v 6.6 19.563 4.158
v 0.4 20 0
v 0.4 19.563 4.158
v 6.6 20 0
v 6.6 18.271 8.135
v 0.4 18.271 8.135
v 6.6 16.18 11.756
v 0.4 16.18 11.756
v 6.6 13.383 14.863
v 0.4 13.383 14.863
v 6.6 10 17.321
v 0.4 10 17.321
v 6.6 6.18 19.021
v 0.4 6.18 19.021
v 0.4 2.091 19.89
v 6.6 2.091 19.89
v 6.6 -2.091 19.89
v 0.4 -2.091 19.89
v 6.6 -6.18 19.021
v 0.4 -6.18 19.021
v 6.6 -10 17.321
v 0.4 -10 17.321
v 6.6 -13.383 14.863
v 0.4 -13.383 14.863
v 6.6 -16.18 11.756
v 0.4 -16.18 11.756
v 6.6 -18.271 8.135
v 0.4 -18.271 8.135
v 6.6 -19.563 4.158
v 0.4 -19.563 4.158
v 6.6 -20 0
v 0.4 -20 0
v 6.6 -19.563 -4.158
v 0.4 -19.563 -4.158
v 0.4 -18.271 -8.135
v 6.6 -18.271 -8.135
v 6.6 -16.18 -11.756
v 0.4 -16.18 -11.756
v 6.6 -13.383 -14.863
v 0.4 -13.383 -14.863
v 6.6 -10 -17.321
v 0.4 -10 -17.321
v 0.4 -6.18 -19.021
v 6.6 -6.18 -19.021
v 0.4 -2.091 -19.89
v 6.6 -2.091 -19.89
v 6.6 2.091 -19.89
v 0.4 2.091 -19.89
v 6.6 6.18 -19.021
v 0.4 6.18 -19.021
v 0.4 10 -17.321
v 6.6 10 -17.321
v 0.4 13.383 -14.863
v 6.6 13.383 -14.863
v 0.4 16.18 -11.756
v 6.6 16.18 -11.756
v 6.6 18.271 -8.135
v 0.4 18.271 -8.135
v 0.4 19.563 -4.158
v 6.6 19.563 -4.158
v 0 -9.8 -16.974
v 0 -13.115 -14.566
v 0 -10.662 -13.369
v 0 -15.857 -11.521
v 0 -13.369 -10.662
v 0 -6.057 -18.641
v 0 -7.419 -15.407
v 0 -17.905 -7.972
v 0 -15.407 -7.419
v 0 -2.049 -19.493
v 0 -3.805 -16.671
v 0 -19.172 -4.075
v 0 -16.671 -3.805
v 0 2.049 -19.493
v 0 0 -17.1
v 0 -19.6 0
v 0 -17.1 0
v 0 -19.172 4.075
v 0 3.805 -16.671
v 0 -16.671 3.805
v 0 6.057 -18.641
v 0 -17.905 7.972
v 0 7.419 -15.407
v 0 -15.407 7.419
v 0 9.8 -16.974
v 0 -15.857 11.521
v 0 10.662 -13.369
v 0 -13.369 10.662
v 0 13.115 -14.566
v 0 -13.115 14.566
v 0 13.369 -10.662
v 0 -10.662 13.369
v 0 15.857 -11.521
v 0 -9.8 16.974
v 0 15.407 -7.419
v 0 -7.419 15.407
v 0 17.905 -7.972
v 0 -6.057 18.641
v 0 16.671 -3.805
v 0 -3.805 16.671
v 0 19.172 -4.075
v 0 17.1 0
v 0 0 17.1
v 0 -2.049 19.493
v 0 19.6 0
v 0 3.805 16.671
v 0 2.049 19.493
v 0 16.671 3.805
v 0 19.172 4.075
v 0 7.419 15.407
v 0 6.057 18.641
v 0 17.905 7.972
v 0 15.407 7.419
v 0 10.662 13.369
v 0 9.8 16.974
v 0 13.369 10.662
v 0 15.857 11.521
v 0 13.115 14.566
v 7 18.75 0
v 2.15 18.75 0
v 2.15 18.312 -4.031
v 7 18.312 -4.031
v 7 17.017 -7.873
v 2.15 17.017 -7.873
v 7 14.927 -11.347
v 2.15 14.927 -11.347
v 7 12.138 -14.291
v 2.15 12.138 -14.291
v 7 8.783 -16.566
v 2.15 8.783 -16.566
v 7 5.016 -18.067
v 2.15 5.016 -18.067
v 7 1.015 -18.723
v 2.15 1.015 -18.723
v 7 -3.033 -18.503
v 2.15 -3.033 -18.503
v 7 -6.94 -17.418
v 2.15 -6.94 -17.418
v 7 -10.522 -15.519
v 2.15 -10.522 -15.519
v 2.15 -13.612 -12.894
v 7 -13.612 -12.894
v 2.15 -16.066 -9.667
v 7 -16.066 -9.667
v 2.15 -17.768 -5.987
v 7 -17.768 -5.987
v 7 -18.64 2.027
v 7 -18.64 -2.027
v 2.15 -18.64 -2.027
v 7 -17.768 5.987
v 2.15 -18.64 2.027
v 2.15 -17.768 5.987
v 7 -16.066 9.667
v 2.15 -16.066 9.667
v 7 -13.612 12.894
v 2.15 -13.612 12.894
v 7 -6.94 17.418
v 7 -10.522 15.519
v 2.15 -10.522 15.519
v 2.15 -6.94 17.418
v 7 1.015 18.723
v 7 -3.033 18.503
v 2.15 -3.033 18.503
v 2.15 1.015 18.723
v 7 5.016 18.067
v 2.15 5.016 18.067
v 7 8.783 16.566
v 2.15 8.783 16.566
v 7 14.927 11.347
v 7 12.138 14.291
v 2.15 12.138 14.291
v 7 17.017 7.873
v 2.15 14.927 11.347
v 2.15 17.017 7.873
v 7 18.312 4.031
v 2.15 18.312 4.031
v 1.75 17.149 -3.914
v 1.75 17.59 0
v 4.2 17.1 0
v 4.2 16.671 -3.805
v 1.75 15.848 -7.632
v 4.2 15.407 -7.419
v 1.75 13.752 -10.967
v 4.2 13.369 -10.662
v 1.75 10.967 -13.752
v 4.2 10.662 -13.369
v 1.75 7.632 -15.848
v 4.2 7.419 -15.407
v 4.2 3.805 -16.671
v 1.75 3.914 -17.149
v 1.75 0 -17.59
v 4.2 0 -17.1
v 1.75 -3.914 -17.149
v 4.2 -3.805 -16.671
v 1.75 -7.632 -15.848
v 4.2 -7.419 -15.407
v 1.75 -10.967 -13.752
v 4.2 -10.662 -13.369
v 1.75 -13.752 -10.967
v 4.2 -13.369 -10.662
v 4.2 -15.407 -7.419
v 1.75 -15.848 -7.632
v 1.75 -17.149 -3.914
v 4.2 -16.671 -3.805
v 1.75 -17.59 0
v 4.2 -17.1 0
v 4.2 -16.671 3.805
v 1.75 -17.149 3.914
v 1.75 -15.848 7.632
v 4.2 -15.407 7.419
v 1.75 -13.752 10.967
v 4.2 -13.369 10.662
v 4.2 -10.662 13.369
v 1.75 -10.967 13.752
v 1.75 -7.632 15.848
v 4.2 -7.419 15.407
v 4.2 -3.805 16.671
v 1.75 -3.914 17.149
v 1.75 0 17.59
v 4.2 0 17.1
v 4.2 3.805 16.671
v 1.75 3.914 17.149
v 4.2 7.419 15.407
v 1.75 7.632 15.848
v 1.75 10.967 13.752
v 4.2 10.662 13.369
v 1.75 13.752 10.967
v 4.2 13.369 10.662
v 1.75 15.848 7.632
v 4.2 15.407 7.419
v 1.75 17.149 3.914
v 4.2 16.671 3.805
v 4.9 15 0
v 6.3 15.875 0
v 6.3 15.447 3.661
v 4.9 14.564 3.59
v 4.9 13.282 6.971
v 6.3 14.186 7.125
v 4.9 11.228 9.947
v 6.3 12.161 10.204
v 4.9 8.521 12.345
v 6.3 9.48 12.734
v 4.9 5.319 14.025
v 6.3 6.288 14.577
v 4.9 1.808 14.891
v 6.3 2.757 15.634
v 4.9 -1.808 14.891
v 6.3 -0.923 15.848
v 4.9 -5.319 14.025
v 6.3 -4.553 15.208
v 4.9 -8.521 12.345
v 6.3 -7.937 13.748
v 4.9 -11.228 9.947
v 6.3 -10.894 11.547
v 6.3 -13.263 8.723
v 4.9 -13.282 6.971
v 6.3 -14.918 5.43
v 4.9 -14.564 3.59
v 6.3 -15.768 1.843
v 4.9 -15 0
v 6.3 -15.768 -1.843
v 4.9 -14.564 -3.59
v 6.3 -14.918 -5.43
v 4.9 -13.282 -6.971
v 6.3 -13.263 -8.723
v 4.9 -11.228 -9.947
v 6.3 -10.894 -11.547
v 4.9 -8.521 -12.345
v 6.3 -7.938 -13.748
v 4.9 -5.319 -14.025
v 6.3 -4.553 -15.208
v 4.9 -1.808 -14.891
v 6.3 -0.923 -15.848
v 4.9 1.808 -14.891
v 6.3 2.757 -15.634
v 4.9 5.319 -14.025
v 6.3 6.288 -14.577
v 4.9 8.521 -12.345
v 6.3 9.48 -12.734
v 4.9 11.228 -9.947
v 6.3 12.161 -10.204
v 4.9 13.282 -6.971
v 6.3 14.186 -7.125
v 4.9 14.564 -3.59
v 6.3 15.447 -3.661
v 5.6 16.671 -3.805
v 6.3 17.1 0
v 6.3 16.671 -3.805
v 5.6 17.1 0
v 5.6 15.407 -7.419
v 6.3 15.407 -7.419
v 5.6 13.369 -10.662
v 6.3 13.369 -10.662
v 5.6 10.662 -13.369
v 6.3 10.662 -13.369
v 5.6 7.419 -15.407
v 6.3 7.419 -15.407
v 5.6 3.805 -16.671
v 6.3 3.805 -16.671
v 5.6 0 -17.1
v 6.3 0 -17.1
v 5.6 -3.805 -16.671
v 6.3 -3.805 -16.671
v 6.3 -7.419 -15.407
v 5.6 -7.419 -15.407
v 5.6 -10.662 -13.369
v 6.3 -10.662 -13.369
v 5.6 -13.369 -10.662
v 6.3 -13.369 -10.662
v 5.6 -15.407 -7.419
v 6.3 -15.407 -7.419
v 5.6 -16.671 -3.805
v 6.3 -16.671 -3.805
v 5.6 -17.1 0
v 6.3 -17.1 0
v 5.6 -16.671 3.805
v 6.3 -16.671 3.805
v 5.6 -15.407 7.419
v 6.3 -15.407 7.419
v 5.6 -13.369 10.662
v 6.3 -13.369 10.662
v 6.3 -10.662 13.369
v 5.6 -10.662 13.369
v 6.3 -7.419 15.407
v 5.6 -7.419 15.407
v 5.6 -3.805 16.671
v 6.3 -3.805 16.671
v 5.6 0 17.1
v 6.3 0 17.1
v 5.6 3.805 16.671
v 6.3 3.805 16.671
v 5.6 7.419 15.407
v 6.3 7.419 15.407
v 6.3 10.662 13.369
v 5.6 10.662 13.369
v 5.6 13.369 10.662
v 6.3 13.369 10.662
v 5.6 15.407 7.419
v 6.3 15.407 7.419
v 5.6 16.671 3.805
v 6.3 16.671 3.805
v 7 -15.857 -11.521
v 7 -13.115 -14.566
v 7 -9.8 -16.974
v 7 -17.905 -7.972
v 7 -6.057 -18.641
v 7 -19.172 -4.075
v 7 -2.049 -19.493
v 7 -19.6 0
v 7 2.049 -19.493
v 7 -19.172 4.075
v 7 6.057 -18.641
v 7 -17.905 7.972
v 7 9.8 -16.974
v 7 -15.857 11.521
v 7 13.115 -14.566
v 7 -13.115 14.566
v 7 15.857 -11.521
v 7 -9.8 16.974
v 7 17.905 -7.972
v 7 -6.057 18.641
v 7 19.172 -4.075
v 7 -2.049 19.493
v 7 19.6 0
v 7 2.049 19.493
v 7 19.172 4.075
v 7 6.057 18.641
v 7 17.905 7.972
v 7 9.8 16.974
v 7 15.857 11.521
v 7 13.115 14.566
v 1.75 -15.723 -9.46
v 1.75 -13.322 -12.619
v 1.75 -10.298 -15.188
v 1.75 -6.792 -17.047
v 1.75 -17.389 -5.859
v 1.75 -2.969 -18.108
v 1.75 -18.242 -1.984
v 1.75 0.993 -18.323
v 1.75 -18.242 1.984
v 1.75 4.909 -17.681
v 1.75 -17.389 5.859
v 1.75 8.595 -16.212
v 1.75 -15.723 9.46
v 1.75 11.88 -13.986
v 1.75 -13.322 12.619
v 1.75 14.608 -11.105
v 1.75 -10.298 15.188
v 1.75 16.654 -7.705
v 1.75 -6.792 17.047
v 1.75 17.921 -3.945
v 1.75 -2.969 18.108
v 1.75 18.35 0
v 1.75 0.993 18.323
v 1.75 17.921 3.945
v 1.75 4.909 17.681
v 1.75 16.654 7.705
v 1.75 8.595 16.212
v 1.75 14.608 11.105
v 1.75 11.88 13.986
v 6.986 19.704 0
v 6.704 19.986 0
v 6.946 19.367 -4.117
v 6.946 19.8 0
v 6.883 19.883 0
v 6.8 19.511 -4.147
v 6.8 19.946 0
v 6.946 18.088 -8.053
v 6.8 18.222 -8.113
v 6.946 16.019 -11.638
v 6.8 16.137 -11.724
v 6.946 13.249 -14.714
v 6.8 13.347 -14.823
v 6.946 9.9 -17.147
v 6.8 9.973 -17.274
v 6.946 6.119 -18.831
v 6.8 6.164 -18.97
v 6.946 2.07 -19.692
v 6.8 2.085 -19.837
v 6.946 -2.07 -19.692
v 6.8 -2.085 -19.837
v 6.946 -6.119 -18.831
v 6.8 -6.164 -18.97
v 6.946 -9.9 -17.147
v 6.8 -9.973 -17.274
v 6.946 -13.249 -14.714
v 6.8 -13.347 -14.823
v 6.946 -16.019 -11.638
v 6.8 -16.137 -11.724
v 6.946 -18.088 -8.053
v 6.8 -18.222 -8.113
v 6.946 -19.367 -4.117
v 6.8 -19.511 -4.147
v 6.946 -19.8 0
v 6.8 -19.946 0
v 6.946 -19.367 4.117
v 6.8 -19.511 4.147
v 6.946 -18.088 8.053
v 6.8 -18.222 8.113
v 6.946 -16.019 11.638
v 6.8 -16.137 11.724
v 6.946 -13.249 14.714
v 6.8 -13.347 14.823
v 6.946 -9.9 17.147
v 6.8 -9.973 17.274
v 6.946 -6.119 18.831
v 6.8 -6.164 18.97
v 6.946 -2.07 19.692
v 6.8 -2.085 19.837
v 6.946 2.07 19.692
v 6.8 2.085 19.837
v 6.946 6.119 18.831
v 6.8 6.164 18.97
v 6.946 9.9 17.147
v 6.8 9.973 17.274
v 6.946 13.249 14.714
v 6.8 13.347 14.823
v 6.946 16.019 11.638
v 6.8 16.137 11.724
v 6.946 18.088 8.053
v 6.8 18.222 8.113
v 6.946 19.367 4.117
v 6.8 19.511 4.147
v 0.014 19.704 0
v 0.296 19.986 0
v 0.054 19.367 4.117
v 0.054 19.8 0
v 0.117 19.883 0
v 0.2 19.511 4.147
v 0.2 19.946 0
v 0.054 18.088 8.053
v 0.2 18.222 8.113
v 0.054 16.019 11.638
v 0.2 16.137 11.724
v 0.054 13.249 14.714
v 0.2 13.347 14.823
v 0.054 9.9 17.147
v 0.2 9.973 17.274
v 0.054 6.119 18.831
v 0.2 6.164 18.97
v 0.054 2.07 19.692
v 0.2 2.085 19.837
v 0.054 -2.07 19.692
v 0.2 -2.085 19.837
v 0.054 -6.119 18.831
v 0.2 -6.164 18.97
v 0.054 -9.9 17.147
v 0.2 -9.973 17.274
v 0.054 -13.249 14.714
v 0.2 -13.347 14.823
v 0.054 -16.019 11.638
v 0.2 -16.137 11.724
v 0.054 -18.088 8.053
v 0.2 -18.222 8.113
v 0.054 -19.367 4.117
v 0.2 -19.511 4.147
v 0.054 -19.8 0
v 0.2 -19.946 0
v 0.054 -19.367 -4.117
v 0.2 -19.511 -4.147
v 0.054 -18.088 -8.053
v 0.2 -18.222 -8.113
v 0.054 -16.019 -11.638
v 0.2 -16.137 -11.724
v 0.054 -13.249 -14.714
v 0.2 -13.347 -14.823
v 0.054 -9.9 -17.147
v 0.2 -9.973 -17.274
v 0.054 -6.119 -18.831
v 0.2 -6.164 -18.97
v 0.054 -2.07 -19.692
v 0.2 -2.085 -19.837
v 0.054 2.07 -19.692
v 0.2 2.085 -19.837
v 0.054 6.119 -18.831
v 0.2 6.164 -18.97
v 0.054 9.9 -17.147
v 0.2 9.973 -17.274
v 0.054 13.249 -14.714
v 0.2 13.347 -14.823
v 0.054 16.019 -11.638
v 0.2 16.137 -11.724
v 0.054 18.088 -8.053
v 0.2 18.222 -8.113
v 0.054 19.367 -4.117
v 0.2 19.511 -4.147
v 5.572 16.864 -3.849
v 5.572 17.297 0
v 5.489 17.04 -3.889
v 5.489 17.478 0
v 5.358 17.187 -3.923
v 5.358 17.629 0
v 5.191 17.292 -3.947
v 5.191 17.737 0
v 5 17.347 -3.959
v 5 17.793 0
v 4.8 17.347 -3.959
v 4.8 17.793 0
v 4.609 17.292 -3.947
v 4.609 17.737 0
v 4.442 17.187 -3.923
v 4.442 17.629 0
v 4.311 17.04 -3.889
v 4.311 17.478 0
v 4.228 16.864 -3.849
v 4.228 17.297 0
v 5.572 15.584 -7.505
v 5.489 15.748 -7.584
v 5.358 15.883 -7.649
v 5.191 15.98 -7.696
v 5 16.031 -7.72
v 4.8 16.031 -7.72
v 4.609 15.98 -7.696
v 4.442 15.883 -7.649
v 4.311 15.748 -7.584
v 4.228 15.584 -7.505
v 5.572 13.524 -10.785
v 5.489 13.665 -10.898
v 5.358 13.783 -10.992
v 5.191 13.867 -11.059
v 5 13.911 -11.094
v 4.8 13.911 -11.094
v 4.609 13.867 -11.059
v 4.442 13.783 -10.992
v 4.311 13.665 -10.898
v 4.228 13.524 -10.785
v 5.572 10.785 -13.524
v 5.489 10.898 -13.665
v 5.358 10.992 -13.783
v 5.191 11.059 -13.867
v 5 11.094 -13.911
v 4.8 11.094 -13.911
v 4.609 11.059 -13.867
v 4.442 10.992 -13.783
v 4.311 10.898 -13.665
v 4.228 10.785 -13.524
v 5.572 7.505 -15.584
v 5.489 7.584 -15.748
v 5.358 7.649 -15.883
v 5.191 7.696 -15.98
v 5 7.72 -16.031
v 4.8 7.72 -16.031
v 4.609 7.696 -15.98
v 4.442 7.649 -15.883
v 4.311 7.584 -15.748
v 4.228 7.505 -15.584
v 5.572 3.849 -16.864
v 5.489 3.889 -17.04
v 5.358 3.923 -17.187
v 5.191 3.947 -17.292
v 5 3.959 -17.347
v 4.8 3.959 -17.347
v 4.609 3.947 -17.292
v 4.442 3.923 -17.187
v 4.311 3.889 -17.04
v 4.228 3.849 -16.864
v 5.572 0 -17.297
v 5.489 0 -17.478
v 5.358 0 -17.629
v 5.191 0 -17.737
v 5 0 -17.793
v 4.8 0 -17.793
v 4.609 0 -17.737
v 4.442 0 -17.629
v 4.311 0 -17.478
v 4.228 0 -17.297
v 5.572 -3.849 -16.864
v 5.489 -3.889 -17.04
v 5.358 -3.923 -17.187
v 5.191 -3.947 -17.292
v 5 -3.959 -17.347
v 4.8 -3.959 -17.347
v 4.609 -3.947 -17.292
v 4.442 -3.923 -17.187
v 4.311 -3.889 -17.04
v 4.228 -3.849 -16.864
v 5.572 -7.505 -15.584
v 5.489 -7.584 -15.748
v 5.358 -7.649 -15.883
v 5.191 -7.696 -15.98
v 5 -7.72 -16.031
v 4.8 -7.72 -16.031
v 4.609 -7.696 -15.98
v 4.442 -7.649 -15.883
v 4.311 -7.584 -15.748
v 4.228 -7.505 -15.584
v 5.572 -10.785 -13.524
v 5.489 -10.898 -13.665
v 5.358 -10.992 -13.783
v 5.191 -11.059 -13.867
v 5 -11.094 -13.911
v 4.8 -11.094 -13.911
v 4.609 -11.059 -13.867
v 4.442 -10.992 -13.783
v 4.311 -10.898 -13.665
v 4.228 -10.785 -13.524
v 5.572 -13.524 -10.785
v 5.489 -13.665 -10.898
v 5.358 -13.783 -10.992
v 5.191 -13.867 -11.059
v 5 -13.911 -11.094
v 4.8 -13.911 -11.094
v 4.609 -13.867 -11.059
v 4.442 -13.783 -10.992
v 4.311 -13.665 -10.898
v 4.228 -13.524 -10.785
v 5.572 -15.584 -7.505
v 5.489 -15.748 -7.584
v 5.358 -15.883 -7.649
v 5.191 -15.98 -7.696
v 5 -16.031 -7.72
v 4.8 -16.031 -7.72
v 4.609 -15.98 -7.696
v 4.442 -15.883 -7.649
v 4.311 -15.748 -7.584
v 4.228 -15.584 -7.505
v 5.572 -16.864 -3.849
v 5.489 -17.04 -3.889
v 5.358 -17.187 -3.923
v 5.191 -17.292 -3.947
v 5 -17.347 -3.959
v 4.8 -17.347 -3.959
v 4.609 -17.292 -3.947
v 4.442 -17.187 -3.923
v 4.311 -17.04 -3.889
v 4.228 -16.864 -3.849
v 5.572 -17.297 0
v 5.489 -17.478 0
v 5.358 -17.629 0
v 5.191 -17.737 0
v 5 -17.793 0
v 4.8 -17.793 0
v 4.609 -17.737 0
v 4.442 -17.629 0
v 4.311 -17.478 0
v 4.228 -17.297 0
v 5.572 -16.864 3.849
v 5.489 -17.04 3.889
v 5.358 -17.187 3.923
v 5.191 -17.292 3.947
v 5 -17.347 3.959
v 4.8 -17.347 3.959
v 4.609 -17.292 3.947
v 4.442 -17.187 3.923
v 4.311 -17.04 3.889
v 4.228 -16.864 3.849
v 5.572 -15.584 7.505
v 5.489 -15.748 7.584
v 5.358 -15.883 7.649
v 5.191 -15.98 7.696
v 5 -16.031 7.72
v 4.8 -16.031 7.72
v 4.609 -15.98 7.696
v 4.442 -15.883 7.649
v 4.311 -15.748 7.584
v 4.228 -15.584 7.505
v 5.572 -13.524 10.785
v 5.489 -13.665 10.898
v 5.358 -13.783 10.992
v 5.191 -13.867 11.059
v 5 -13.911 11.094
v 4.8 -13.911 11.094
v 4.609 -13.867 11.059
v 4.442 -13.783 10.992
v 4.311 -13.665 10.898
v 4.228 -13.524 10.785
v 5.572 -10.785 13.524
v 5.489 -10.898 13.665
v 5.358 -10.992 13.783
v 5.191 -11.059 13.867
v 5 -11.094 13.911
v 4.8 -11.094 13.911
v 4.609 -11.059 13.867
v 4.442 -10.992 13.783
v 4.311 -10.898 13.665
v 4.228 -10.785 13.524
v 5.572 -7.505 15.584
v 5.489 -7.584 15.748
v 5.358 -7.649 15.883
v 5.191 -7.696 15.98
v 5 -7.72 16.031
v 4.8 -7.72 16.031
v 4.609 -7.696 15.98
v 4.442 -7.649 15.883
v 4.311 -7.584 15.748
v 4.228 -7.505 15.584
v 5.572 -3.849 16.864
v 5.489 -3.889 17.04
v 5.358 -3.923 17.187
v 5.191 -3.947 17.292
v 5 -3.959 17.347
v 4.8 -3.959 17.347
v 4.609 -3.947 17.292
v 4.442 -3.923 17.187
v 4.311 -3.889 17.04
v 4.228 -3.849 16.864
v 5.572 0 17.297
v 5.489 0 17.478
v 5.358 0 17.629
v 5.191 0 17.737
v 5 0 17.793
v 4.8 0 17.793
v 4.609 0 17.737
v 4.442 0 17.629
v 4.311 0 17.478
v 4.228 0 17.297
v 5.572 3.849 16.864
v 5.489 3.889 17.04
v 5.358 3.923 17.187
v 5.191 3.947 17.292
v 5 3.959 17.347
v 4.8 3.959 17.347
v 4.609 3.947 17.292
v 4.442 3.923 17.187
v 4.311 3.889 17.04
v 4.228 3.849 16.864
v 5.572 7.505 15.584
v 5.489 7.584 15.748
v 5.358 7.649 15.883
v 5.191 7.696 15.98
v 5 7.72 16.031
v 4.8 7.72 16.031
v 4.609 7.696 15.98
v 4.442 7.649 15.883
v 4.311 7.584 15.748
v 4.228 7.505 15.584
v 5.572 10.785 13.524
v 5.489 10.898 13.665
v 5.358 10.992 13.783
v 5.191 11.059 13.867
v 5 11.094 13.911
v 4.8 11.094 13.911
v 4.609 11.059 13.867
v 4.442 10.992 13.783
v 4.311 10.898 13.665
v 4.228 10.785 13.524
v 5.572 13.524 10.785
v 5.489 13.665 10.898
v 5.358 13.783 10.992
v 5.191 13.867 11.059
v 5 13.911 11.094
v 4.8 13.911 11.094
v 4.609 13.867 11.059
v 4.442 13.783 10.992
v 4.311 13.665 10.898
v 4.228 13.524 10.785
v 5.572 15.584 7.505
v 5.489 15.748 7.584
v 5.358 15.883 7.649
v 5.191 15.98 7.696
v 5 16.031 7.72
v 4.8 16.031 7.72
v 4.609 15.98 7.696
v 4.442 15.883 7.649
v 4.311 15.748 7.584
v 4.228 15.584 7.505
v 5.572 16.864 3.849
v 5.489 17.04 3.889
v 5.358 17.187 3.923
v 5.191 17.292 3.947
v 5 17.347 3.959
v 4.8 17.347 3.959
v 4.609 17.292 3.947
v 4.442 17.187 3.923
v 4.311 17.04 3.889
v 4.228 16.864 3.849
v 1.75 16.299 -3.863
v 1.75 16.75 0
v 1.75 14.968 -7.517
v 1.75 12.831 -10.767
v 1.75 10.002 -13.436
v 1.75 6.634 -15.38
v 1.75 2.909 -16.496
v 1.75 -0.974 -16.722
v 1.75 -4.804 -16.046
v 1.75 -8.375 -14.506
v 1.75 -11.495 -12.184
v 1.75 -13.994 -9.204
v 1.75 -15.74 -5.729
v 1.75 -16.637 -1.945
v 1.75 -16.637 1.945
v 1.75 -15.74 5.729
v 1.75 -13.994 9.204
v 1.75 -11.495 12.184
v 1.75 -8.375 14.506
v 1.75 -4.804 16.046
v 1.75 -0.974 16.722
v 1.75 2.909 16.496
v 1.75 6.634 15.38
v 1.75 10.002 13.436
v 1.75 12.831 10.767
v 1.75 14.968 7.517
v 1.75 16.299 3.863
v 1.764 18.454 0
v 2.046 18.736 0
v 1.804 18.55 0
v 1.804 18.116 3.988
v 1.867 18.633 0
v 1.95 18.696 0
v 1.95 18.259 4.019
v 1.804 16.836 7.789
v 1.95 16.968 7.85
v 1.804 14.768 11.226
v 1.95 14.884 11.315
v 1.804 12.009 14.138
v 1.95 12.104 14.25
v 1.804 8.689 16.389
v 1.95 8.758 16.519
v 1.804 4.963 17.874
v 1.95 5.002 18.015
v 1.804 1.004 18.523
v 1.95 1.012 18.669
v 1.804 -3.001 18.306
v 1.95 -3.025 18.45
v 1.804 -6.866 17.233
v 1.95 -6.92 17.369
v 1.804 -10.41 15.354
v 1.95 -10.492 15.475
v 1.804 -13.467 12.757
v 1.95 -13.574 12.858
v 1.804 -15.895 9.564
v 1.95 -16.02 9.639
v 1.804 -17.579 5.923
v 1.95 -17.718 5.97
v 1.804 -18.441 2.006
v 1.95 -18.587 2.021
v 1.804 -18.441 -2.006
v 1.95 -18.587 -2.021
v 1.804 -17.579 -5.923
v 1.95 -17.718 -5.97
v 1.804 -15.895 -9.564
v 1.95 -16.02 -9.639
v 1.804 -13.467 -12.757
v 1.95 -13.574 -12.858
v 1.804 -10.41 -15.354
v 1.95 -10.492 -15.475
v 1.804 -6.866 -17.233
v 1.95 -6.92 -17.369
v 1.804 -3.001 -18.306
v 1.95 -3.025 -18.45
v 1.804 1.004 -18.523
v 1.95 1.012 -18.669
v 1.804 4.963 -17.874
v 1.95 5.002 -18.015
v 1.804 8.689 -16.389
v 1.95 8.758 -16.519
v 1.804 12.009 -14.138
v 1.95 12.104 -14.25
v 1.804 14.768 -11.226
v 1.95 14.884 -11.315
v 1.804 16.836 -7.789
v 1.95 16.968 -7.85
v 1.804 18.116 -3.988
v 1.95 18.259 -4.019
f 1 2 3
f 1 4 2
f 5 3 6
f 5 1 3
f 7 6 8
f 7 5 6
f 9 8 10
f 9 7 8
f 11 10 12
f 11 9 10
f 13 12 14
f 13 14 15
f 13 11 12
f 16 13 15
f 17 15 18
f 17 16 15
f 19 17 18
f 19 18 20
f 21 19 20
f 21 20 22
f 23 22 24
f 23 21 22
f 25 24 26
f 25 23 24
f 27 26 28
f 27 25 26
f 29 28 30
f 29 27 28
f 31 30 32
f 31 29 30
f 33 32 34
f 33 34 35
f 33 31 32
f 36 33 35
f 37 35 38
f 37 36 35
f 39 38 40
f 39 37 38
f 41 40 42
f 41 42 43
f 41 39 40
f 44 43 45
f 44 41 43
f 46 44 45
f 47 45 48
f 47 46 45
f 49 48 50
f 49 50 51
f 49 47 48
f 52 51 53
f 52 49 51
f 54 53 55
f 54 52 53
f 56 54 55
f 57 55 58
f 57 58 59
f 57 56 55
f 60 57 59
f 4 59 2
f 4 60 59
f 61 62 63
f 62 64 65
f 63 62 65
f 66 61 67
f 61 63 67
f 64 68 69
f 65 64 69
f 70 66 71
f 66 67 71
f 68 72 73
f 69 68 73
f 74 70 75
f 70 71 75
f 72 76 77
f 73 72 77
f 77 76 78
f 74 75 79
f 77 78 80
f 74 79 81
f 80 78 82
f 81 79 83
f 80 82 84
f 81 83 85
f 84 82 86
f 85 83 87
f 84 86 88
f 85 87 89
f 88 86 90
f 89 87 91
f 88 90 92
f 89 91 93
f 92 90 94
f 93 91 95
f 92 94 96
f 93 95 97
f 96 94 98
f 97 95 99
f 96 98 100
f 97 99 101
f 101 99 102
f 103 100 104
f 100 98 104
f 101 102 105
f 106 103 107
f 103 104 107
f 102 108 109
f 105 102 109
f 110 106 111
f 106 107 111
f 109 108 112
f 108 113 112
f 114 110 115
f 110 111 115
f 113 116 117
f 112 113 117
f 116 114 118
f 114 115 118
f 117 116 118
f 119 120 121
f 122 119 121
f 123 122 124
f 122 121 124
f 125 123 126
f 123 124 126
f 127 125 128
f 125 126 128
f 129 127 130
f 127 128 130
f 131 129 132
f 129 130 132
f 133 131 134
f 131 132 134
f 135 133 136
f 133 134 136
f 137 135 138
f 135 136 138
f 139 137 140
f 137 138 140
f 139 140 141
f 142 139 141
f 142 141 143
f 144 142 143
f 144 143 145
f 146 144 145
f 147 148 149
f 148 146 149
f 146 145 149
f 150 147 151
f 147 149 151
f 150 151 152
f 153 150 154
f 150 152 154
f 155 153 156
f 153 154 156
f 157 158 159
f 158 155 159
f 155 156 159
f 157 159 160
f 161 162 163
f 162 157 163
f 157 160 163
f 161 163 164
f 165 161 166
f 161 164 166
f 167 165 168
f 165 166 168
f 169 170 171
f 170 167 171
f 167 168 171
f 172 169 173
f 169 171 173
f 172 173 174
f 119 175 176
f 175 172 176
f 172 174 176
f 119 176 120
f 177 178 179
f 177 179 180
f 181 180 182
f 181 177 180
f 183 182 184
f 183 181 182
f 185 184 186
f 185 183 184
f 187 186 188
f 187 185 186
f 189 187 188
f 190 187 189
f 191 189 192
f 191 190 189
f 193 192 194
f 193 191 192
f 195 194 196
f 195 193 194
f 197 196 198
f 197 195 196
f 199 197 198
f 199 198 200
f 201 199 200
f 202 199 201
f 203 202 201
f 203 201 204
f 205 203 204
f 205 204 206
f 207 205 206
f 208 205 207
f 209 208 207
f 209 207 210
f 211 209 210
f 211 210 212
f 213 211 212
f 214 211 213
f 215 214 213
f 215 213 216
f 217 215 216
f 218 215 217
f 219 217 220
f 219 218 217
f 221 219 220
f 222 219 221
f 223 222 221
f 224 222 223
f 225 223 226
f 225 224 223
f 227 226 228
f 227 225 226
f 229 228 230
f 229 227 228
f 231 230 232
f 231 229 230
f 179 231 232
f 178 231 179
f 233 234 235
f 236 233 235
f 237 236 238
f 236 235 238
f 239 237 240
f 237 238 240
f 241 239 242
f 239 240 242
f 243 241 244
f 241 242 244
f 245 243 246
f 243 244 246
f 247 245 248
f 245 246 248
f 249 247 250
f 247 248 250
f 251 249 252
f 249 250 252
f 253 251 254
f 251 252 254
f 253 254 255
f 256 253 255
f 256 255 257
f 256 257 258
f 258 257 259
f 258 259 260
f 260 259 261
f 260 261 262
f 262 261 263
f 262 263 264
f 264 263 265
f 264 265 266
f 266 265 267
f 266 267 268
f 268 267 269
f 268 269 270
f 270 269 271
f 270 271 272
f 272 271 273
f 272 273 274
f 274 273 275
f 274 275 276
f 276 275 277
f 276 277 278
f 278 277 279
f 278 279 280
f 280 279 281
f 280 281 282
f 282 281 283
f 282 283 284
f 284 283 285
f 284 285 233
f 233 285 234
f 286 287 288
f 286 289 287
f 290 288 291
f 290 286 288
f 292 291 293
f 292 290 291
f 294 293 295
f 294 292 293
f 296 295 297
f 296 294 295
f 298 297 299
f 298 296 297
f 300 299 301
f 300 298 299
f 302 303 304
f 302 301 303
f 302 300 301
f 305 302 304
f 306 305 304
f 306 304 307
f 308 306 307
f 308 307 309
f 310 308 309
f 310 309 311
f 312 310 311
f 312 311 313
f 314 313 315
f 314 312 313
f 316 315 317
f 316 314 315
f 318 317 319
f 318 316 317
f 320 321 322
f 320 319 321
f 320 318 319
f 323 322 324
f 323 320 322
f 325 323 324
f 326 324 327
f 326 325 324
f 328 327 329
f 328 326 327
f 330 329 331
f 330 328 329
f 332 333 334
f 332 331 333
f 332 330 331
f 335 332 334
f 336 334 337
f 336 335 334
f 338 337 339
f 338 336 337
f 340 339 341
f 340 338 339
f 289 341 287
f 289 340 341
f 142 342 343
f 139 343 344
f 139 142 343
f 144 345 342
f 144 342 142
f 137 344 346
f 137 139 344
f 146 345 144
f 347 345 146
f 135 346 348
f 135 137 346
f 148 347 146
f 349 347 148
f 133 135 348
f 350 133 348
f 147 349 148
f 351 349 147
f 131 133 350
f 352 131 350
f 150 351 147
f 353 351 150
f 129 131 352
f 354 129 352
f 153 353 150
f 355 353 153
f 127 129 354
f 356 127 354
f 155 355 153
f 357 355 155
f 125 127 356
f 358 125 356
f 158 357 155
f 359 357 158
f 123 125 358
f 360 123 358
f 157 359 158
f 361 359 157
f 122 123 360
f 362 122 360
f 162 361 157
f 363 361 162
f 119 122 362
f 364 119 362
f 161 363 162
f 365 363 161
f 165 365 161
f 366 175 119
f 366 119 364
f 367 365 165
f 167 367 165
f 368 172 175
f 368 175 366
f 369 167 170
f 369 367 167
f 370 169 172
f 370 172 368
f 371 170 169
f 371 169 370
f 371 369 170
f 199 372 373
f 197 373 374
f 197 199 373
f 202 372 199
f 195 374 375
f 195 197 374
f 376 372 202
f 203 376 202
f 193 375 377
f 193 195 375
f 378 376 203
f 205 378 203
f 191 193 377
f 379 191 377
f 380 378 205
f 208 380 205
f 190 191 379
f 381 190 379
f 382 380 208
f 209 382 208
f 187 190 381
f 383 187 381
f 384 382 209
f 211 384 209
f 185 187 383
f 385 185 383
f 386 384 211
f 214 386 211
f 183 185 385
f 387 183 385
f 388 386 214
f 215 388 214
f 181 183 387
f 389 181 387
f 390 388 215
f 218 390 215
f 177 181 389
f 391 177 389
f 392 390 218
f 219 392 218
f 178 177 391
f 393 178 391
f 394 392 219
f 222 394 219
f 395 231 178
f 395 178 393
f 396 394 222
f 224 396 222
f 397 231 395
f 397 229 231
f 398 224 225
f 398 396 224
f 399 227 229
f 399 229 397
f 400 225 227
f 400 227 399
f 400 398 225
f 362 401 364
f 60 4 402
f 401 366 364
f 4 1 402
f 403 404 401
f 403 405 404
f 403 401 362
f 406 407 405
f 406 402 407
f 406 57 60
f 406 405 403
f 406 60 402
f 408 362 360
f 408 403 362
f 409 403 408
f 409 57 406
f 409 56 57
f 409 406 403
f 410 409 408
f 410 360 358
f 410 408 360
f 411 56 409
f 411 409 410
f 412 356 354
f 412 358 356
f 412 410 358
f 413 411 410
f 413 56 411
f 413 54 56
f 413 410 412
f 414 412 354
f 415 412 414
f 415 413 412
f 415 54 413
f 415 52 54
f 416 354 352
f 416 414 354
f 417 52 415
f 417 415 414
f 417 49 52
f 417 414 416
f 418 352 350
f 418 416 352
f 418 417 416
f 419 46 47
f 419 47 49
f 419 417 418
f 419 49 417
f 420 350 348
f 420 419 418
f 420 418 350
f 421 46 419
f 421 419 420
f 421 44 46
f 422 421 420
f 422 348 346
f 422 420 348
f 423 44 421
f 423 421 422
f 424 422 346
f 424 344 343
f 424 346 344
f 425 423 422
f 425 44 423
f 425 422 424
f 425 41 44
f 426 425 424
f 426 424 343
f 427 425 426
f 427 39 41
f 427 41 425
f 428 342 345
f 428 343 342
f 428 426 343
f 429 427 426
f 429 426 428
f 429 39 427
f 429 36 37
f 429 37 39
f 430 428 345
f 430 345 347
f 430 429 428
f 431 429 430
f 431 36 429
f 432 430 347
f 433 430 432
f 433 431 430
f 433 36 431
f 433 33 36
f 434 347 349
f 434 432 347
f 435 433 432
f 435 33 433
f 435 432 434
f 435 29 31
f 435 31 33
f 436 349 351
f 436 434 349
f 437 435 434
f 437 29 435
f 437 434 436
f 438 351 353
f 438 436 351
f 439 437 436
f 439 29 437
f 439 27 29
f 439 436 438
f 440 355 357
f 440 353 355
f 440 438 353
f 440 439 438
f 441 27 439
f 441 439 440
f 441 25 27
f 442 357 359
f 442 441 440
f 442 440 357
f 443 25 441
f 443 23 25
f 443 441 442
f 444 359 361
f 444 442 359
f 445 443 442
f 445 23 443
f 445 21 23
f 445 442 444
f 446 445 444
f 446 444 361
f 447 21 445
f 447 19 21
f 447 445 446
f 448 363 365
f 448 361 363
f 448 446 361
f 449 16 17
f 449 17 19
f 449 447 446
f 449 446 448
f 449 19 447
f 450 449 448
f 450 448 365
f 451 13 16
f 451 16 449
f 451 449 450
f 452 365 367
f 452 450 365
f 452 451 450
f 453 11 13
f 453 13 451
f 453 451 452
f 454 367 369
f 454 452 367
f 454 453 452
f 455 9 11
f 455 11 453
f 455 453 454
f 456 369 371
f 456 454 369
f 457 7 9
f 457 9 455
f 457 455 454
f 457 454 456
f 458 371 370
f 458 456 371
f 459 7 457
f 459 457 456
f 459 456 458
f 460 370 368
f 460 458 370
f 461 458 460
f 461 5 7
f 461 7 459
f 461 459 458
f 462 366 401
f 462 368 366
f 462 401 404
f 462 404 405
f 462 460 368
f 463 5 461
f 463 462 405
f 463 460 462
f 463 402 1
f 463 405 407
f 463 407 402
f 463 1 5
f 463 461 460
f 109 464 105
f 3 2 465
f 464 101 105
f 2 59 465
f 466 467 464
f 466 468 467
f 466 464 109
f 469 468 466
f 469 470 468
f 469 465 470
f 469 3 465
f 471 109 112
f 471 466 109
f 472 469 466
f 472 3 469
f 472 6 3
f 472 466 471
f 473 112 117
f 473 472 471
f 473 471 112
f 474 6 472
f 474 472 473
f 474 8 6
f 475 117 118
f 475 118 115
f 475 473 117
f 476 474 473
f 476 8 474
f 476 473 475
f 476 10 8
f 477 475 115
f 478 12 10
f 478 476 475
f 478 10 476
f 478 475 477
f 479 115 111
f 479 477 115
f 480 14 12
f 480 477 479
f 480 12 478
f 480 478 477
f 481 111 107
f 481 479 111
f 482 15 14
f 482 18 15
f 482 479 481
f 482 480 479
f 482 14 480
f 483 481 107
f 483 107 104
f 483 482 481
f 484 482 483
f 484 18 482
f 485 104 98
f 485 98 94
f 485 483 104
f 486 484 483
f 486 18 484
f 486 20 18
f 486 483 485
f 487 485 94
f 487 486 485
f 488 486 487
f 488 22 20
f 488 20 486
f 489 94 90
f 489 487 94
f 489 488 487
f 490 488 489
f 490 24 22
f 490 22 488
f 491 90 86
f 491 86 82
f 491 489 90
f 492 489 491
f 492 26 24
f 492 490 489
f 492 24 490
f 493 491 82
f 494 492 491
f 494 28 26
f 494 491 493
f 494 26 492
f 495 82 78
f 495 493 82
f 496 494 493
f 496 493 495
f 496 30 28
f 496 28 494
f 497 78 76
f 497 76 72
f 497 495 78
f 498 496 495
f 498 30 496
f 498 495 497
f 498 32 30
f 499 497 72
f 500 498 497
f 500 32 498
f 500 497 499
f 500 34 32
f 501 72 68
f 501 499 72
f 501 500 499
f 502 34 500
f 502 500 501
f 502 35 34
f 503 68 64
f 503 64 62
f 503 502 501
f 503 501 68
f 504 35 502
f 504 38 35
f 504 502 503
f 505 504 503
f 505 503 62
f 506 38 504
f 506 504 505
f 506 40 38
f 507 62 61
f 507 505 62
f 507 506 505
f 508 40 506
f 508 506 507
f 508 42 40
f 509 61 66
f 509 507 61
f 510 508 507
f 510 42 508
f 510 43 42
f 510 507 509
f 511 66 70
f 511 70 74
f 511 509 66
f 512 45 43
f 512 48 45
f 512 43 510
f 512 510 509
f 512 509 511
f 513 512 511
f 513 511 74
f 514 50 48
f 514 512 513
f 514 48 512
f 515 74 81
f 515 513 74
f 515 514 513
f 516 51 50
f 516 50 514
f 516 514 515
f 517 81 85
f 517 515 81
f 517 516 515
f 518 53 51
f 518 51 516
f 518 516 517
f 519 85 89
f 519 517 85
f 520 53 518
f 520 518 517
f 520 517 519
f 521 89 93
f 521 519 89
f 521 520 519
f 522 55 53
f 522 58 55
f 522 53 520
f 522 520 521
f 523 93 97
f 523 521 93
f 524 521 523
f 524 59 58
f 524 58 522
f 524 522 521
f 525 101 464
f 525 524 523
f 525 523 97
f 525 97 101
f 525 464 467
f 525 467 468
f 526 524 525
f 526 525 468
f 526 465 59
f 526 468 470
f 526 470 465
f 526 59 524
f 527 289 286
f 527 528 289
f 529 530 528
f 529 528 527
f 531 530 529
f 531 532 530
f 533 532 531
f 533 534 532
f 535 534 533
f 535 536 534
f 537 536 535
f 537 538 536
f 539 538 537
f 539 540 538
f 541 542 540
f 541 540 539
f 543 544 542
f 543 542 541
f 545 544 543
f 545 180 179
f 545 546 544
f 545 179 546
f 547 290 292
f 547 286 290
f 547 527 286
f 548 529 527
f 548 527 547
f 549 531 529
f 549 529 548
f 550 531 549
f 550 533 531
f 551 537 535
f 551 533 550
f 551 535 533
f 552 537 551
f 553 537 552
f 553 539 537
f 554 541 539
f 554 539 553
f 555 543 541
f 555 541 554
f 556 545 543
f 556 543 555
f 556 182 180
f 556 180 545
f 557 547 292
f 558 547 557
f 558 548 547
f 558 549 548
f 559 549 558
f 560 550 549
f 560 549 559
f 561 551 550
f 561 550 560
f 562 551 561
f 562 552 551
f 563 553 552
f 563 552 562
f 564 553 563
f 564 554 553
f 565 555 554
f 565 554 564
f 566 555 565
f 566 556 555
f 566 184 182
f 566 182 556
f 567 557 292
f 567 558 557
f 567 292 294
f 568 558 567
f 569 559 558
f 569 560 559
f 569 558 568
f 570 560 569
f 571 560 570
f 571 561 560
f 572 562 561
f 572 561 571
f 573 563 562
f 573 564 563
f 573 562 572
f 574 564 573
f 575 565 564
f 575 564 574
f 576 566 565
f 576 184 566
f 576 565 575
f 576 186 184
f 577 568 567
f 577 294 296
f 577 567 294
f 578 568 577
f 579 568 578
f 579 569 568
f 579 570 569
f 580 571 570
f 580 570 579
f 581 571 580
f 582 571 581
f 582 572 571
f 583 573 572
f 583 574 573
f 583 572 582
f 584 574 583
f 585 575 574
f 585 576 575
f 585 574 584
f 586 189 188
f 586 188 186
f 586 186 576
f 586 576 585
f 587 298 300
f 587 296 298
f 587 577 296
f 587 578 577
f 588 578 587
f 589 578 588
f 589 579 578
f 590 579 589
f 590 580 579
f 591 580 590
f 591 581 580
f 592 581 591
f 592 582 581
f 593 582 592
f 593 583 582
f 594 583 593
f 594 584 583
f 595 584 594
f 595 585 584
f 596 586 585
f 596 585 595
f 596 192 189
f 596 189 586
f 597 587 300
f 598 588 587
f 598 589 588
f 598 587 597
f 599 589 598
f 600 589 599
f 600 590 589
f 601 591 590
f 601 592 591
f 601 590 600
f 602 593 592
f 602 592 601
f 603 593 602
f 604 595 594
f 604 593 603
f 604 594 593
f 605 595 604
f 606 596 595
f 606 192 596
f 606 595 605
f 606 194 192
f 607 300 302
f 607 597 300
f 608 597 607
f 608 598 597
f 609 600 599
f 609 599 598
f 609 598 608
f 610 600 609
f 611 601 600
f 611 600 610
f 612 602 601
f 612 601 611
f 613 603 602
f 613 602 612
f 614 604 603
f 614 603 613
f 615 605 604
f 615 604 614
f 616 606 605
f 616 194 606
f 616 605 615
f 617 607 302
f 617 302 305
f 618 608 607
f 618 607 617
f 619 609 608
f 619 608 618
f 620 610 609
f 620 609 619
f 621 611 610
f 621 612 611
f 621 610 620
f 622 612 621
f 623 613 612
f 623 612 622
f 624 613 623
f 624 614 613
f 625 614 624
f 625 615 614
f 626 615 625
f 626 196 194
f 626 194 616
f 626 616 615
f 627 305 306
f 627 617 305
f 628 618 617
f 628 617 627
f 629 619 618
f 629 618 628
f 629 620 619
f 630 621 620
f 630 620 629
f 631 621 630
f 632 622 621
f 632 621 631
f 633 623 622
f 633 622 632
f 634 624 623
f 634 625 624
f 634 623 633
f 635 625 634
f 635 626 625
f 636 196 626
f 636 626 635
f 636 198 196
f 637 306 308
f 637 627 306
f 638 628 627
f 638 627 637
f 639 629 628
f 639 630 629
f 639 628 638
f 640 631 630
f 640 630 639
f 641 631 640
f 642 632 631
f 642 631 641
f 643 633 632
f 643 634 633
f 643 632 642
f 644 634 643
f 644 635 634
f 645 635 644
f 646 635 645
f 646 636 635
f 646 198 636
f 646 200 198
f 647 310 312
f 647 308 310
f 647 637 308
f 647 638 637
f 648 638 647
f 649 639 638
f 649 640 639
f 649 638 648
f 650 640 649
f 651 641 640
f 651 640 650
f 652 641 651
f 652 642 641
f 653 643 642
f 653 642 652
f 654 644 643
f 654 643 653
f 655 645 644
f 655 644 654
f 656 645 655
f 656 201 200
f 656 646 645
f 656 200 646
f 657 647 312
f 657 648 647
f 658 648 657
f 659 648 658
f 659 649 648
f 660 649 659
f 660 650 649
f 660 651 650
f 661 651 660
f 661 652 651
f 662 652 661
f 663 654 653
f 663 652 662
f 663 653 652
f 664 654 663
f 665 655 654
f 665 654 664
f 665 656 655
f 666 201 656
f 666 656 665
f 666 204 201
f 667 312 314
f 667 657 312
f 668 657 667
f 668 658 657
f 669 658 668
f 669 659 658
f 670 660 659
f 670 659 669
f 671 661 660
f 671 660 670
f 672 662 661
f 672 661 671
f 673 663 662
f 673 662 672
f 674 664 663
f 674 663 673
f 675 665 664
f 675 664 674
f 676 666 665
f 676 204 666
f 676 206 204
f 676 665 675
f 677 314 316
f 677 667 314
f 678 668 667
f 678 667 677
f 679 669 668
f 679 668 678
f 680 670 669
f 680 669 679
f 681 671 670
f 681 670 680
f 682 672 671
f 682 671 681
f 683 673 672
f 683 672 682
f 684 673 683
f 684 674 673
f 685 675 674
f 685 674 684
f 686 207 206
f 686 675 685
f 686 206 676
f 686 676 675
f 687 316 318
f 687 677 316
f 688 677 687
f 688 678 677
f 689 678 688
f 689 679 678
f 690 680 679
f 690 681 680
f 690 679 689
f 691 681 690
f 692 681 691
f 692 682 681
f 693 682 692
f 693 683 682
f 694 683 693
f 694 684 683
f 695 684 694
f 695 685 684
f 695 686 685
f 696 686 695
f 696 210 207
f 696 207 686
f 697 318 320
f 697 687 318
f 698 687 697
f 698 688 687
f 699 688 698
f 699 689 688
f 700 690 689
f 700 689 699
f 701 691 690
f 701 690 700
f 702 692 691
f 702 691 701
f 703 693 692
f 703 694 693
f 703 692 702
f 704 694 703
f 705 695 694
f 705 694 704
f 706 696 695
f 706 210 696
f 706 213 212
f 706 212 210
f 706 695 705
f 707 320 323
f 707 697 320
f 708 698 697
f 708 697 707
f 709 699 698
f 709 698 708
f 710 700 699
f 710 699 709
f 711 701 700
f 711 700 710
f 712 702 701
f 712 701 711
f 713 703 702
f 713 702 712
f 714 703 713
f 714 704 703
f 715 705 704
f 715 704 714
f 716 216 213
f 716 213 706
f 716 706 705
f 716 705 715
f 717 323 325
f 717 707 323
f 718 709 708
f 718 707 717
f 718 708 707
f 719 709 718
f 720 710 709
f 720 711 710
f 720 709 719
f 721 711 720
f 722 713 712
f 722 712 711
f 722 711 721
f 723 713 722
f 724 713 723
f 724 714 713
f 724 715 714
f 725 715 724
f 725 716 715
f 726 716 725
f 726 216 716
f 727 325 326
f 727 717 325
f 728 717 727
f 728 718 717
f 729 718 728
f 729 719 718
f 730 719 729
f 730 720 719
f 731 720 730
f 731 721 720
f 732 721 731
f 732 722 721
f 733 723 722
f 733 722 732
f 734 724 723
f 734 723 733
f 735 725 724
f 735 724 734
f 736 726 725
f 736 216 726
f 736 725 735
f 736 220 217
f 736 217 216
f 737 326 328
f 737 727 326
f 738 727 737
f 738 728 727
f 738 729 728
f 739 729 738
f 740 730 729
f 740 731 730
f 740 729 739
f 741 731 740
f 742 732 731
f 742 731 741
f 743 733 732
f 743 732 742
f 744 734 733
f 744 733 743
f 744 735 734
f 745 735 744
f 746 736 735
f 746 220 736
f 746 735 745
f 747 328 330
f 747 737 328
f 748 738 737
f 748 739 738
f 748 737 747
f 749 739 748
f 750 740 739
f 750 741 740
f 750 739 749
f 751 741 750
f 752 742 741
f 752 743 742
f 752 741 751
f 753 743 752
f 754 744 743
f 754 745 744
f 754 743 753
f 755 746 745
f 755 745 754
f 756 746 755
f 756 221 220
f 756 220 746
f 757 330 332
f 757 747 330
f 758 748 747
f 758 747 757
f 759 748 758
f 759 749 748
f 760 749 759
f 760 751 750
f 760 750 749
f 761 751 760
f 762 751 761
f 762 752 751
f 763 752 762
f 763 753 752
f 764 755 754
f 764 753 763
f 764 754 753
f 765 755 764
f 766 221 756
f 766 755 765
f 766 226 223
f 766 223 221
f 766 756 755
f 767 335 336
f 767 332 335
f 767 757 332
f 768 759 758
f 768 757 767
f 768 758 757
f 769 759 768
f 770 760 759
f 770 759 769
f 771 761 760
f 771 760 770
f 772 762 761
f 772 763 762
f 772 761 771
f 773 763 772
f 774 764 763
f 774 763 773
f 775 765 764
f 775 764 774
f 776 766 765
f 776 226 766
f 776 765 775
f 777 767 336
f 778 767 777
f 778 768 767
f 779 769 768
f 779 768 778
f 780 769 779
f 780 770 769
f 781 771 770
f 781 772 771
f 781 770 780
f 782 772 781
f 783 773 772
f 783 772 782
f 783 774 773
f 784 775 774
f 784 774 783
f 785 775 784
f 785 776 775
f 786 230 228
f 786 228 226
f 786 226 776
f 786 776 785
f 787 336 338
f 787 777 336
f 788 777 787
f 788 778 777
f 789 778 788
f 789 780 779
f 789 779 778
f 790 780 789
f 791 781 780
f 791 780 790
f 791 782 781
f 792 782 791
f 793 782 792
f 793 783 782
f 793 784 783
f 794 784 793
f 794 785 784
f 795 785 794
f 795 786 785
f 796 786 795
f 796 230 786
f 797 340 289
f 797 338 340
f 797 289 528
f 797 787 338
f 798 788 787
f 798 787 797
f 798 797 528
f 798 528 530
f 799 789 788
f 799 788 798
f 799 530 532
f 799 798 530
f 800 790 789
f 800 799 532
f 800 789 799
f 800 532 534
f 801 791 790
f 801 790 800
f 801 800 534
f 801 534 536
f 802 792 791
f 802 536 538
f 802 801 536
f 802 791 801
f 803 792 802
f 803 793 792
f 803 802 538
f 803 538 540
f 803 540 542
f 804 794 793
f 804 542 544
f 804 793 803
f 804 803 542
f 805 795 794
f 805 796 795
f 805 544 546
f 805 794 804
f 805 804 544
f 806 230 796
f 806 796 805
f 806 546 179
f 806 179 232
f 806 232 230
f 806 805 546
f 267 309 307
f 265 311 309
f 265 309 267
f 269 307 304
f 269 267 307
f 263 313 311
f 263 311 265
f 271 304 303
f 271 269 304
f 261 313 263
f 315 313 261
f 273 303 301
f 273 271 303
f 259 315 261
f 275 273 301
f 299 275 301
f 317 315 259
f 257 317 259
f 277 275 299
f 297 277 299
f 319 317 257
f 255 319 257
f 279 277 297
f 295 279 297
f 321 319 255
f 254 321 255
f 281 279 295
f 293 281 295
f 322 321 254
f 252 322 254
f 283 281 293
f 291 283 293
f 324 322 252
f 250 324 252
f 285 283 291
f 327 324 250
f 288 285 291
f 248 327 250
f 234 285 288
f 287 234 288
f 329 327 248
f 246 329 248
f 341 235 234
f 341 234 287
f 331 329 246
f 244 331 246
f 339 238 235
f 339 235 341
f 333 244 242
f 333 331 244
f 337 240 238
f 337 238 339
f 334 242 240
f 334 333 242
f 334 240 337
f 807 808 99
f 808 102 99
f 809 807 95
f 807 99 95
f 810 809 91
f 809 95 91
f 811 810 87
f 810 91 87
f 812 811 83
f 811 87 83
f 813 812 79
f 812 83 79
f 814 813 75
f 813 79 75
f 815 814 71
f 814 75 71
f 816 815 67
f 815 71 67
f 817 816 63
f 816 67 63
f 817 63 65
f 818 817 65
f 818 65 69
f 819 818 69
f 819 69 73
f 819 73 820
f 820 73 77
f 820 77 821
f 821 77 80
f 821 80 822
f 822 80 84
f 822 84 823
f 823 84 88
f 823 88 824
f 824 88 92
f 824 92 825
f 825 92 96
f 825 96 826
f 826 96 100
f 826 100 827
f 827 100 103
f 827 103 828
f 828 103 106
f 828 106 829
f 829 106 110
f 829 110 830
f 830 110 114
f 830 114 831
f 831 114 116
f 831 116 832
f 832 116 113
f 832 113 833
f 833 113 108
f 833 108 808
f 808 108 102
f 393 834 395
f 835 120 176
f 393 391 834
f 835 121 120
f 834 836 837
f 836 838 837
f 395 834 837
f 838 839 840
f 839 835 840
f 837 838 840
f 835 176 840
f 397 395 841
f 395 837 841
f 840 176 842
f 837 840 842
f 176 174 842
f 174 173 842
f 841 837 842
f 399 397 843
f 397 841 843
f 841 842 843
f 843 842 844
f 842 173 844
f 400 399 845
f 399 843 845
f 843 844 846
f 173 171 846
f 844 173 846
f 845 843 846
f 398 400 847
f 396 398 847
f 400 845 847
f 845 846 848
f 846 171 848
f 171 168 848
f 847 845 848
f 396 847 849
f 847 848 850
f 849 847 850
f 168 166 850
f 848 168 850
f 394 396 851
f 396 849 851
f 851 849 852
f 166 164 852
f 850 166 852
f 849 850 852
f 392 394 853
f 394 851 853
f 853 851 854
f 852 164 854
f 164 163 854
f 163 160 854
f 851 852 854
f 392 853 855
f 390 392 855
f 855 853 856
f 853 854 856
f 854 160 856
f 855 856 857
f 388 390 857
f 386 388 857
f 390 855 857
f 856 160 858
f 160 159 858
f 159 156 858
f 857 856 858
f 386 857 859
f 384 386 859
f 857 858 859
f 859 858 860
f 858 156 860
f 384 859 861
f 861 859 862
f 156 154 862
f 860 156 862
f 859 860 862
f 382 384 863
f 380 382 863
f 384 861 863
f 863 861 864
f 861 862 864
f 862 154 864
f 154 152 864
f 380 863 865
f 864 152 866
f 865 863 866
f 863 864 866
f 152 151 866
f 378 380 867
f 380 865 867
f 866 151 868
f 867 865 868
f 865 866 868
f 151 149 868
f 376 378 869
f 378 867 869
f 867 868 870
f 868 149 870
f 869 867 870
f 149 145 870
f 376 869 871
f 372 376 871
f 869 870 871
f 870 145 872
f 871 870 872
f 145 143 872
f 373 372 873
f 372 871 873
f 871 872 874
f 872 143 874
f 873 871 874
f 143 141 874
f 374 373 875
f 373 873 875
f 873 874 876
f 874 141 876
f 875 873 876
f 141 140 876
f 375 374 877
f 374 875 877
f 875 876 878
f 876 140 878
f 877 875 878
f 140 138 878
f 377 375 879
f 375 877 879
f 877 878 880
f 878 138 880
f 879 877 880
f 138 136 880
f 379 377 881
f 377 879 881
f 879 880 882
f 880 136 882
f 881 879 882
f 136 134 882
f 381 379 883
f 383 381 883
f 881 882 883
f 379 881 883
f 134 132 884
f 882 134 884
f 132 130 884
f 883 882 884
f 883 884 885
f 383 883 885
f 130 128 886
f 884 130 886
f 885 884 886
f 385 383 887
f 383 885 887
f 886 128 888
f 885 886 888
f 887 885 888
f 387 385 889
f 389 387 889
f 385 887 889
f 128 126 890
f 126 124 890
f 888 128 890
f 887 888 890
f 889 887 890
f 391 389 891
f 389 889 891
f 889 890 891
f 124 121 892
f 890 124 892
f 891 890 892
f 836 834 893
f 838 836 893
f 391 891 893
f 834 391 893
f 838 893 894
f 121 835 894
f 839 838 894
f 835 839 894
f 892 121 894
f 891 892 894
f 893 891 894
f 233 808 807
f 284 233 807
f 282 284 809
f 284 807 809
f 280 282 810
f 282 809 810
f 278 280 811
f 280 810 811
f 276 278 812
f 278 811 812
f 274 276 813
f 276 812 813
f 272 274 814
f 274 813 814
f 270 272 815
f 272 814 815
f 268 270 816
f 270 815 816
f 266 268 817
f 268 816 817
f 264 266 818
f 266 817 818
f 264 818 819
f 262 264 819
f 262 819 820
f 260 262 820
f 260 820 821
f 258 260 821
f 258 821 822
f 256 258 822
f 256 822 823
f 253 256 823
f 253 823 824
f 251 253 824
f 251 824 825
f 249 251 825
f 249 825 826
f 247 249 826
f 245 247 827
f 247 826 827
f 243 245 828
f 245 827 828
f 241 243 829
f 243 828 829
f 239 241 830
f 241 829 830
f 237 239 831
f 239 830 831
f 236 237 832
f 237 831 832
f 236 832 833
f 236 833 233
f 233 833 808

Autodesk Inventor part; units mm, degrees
ref_plane "YZ Plane" through (0, 0, 0) normal (1, 0, 0) x (0, 1, 0)
ref_plane "XZ Plane" through (0, 0, 0) normal (0, 1, 0) x (-1, 0, 0)
ref_plane "XY Plane" through (0, 0, 0) normal (0, 0, 1) x (1, 0, 0)
sketch "Skizze1" plane through (0, 0, 0) normal (0, 0, 1) x (1, 0, 0)
  circle A0 centre (4.9, 17.1) radius 0.455
  circle A1 centre (4.9, 17.1) radius 0.7
  line L0 (6.3, 15.875) -> (6.3, 17.1)
  line L1 (0, 20) -> (7, 20)
  line L2 (7, 20) -> (7, 18.75)
  line L3 (7, 18.75) -> (1.75, 18.75)
  line L4 (0, 0) -> (9.5856, 0)
  line L5 (0, 20) -> (0, 17.1)
  line L6 (0, 17.1) -> (1.75, 16.75)
  line L7 (1.75, 16.75) -> (4.9, 15)
  line L8 (4.9, 15) -> (6.3, 15.875)
  line L9 (4.9, 15) -> (0, 15) construction
  line L10 (0, 18) -> (0, -3) projected
  line L11 (-1.9171, 0) -> (11.5027, 0) projected
  line L12 (4.2, 17.1) -> (1.75, 17.59)
  line L13 (1.75, 17.59) -> (1.75, 18.75)
  line L14 (6.3, 17.1) -> (5.6, 17.1)
  dimension "d0" = 40
  dimension "d1" = 31.75
  dimension "d2" = 1.25
  dimension "d3" = 0.91
  dimension "d4" = 1.4
  dimension "d5" = 30
  dimension "d6" = 33.5
  dimension "d7" = 34.2
  dimension "d8" = 4.9
  dimension "d9" = 6.3
  dimension "d10" = 7
  dimension "d12" = 1.75
revolve "Körper" add sketch "Skizze1" angle 360 about axis through (0, 0, 0) along (1, 0, 0) contours L14 L0 L8 L7 L6 L5 L1 L2 L3 L13 L12 A1
revolve "Feder1" add sketch "Skizze1" angle 360 about axis through (0, 0, 0) along (1, 0, 0) contours A0 | A1
fillet "Rundung1" radius 0.4 3 edges at (7, -20, 0) (1.75, -18.75, 0) (0, -20, 0)
equation "\"d0\" = SD2"
equation "\"d1\" = ABDM"
equation "\"d3\" = SPDI"
equation "\"d4\" = SPDA"
equation "\"d5\" = NND"
equation "\"d6\" = TKDM"
equation "\"d7\" = HLDM"
equation "\"d8\" = SPDST"
equation "\"d9\" = SDI"
equation "\"d10\" = SWDT"
equation "\"d12\" = SD"
equation "\"d11\" = RR"
equation "\"SD2\" = 40"
equation "\"SWDT\" = 7"
equation "\"RR\" = 0.4"
equation "\"SD\" = 1.75"
equation "\"NND\" = 30"
equation "\"SPDA\" = 1.4"
equation "\"SPDI\" = 0.91"
equation "\"TKDM\" = 33.5"
equation "\"HLDM\" = 34.2"
equation "\"ABDM\" = 31.75"
equation "\"SDI\" = 6.3"
equation "\"SPDST\" = 4.9"
equation "\"LAB\" = 0.35"
properties part number "DIN 3760 - A - 30 x 40 x 7 - NBR" material "Gummi"
